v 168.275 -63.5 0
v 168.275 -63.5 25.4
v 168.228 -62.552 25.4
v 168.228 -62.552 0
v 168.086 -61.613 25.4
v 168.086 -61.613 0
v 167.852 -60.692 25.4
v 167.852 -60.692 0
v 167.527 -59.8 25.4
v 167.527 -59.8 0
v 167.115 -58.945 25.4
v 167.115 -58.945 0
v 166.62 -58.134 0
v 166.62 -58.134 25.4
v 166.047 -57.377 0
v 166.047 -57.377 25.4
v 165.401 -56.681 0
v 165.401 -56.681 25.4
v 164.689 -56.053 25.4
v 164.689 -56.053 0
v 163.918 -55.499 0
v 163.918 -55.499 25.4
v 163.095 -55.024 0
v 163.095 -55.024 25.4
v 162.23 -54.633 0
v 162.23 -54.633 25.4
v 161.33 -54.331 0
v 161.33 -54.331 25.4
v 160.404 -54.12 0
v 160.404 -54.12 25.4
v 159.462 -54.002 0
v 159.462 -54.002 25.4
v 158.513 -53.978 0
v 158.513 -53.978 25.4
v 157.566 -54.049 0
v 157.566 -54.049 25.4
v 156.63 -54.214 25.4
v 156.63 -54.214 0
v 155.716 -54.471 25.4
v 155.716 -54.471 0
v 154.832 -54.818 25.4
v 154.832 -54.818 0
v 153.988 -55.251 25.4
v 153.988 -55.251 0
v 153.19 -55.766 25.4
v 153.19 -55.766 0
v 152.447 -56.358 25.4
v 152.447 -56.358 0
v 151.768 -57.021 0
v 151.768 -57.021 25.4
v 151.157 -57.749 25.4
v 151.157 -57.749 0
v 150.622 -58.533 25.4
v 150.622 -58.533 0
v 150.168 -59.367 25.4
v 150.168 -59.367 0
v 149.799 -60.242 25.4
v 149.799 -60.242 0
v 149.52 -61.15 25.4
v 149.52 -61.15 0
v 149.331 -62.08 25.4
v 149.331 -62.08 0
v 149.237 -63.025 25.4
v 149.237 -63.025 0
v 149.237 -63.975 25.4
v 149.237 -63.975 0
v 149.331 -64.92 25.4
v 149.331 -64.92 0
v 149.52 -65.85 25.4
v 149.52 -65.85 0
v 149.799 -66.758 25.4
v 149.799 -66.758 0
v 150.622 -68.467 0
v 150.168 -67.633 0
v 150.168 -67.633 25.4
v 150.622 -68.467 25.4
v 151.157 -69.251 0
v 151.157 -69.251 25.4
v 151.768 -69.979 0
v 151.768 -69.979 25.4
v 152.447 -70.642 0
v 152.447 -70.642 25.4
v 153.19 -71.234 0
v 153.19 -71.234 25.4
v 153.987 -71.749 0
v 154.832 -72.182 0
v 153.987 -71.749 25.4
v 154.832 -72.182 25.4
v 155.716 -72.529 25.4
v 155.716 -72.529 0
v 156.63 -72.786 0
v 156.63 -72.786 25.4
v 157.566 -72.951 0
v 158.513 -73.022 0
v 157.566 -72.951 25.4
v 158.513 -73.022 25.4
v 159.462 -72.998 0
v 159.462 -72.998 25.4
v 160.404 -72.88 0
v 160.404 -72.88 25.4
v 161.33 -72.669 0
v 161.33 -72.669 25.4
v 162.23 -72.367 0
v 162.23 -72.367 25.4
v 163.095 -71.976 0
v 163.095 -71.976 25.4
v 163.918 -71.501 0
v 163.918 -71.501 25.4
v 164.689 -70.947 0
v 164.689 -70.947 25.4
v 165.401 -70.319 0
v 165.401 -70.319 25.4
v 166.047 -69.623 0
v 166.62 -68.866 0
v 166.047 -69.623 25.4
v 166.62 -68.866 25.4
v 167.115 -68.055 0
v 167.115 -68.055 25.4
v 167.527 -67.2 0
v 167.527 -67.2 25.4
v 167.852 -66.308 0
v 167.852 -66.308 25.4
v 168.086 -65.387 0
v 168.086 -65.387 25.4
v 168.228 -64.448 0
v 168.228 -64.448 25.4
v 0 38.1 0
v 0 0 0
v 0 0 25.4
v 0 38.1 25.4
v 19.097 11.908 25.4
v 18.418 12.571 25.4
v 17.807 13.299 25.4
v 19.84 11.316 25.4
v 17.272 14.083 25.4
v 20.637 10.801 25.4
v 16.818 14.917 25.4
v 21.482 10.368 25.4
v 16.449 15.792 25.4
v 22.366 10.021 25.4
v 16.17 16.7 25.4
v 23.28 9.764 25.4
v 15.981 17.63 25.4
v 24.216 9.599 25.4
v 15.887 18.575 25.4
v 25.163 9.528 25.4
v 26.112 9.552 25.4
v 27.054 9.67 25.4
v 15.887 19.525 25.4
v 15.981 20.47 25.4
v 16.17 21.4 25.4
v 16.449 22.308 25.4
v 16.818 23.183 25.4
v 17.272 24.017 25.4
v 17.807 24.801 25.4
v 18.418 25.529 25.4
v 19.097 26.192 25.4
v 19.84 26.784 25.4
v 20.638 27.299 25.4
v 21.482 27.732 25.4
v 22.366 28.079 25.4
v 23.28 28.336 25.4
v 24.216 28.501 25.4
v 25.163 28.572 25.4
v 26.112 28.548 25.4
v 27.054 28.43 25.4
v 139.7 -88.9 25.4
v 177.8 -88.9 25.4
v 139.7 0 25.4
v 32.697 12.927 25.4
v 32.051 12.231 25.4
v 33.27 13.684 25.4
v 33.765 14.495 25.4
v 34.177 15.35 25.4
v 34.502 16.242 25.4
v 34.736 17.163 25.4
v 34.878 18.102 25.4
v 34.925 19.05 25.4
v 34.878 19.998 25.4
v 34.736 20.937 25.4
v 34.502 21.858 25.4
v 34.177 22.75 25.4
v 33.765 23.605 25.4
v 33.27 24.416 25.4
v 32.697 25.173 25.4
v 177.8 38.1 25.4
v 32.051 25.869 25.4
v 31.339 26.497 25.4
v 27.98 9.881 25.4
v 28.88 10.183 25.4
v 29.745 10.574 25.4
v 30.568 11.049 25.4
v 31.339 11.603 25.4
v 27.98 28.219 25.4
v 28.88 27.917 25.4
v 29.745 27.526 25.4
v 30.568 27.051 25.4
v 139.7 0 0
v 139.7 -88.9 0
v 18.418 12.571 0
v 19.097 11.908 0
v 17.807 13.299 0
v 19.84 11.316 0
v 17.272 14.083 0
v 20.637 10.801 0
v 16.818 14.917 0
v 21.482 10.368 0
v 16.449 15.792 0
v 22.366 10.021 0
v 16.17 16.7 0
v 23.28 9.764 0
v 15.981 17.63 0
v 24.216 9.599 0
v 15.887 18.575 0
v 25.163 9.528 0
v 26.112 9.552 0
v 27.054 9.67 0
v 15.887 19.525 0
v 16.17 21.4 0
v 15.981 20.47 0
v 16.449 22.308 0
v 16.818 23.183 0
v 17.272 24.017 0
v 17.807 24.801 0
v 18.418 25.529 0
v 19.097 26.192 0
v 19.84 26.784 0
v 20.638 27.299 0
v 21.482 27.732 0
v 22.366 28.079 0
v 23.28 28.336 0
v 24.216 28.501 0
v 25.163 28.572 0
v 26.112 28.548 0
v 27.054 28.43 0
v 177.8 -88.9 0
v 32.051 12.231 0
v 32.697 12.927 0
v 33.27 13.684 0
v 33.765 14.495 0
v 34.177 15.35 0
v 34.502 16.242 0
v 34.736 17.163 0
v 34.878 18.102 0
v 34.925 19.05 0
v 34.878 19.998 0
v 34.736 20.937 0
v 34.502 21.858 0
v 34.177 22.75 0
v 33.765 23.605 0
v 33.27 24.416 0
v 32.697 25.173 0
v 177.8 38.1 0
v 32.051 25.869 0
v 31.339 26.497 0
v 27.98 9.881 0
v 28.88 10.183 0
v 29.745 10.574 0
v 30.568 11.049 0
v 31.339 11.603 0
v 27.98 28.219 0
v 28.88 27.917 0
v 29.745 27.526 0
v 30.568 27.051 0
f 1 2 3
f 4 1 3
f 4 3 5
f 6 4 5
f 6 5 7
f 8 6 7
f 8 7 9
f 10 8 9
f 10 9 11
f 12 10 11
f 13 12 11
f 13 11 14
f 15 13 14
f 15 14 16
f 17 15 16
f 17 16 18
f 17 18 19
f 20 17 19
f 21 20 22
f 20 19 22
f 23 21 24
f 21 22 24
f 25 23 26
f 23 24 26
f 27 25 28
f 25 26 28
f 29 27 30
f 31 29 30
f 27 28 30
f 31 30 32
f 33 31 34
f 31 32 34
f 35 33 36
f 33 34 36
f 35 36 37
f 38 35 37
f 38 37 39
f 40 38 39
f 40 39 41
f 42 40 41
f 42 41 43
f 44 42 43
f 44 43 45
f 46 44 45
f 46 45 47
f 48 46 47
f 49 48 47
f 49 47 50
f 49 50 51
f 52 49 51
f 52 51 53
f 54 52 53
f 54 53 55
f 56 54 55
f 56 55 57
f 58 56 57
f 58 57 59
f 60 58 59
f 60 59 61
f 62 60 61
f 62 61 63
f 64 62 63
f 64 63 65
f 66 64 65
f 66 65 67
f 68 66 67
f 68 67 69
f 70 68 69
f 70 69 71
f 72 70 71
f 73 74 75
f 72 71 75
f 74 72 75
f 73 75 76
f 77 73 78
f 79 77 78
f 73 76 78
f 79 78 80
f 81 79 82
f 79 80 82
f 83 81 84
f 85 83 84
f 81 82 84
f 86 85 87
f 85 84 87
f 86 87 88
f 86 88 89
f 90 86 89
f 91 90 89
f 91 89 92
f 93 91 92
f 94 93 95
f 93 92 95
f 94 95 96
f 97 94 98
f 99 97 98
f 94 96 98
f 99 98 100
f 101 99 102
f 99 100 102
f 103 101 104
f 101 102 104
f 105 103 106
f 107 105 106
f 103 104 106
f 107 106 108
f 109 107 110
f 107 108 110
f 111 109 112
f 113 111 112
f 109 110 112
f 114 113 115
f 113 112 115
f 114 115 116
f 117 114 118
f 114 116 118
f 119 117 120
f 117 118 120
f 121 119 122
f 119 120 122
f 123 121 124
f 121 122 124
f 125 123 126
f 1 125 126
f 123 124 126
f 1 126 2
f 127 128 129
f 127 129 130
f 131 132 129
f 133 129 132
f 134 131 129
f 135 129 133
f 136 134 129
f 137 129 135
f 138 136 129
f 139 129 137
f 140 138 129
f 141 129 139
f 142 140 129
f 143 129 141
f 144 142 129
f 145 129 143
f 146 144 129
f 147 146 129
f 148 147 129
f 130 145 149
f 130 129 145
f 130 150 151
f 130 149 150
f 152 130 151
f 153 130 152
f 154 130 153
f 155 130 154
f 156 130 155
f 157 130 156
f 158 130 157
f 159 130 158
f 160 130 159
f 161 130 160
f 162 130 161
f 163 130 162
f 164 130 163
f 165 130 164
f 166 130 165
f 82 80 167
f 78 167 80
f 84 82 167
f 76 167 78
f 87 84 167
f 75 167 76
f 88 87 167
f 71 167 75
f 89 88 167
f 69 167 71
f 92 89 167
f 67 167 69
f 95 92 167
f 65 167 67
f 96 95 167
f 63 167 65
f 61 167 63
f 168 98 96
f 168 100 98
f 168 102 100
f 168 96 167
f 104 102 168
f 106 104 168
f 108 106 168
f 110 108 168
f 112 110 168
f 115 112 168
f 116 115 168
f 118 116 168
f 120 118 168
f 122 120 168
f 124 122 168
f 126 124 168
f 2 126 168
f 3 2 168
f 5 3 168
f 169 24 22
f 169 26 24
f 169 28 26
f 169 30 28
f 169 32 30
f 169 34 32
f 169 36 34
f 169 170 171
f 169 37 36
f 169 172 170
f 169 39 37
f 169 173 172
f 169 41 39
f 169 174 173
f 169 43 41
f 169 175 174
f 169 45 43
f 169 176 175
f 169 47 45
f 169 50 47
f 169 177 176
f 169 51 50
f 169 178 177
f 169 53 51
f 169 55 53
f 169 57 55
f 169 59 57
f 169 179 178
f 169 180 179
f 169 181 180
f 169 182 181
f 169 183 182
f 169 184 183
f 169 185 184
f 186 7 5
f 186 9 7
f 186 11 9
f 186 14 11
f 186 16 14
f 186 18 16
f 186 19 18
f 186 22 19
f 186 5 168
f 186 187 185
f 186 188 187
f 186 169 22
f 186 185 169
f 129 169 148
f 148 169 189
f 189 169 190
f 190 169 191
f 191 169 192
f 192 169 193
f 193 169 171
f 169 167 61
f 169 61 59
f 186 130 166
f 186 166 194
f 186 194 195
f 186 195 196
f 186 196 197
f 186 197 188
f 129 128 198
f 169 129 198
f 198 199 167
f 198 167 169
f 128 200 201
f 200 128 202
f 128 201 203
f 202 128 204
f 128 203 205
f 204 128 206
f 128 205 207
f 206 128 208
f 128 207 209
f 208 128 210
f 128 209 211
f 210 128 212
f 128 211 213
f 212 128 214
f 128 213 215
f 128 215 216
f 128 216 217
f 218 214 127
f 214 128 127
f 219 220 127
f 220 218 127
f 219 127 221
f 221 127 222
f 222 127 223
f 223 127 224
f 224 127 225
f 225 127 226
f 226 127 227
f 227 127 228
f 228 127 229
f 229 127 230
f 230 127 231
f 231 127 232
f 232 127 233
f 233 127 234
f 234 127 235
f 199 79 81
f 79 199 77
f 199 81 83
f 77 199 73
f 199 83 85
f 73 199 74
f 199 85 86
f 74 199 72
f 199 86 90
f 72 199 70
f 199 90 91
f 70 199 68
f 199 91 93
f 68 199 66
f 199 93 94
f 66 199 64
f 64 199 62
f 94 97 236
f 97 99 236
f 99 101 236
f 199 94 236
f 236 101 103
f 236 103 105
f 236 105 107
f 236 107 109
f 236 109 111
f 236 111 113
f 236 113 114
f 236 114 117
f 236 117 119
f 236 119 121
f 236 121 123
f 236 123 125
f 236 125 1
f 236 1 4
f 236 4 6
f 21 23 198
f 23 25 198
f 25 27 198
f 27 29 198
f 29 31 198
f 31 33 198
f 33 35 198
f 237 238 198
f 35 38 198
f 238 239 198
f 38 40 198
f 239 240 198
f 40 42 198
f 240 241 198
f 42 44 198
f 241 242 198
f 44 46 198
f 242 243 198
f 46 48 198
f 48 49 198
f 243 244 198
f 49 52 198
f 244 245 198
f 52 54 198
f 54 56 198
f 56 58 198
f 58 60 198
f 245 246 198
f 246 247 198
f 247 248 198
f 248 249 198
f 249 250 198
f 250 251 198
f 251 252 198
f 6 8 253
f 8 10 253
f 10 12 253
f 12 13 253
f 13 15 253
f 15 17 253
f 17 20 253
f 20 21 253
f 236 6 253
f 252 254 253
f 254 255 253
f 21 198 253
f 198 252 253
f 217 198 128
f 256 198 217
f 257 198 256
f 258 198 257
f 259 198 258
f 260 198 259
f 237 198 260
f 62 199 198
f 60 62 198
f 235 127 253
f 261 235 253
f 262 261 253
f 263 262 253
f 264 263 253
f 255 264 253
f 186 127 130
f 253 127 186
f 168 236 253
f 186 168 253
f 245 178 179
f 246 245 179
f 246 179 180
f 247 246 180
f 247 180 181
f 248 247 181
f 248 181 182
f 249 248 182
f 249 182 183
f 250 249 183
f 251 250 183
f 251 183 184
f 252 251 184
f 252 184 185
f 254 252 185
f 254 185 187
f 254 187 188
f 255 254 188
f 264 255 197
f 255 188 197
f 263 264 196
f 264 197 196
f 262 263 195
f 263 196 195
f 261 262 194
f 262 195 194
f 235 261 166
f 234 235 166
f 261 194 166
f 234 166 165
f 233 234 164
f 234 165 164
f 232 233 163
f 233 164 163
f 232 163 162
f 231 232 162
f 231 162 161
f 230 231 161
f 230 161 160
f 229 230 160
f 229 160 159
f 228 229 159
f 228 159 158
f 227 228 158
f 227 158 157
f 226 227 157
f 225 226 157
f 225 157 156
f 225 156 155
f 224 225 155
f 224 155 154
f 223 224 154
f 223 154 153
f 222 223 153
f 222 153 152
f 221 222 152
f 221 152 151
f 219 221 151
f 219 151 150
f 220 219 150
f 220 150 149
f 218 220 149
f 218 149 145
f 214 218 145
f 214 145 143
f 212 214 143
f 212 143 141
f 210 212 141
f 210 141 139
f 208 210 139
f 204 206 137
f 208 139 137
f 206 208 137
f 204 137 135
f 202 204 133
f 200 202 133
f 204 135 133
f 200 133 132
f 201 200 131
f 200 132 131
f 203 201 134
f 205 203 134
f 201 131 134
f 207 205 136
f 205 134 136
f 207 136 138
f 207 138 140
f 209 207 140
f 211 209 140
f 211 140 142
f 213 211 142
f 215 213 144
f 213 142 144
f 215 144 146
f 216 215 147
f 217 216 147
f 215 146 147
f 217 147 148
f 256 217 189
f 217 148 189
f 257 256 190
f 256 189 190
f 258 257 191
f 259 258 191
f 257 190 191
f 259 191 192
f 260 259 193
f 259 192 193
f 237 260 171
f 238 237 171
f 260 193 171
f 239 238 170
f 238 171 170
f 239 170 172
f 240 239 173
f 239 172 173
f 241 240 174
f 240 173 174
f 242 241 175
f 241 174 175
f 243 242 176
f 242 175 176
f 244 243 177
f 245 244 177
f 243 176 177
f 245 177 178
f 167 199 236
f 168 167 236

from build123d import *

# Parameters (mm, degrees)
SKETCH1_W           = 177.8
SKETCH1_H           = 38.1
SKETCH1_W_2         = 38.1
SKETCH1_H_2         = 88.9
BOSS_EXTRUDE1_DEPTH = 25.4
SKETCH2_R           = 9.525
CUT_EXTRUDE1_DEPTH  = 26.4
SKETCH3_R           = 9.525
CUT_EXTRUDE2_DEPTH  = 26.4


with BuildPart() as part:
    # Sketch1 → Boss-Extrude1 (new body)
    with BuildSketch(Plane.XY):
        with Locations((88.9, 19.05)):
            Rectangle(SKETCH1_W, SKETCH1_H)
        with Locations((158.75, -44.45)):
            Rectangle(SKETCH1_W_2, SKETCH1_H_2)
    extrude(amount=BOSS_EXTRUDE1_DEPTH)

    # Sketch2 → Cut-Extrude1 (cut, through all)
    with BuildSketch(Plane.XY.offset(25.4)):
        with Locations((25.4, 19.05)):
            Circle(SKETCH2_R)
    extrude(amount=-CUT_EXTRUDE1_DEPTH, mode=Mode.SUBTRACT)

    # Sketch3 → Cut-Extrude2 (cut, through all)
    with BuildSketch(Plane.XY.offset(25.4)):
        with Locations((158.75, -63.5)):
            Circle(SKETCH3_R)
    extrude(amount=-CUT_EXTRUDE2_DEPTH, mode=Mode.SUBTRACT)


solid = part.part
